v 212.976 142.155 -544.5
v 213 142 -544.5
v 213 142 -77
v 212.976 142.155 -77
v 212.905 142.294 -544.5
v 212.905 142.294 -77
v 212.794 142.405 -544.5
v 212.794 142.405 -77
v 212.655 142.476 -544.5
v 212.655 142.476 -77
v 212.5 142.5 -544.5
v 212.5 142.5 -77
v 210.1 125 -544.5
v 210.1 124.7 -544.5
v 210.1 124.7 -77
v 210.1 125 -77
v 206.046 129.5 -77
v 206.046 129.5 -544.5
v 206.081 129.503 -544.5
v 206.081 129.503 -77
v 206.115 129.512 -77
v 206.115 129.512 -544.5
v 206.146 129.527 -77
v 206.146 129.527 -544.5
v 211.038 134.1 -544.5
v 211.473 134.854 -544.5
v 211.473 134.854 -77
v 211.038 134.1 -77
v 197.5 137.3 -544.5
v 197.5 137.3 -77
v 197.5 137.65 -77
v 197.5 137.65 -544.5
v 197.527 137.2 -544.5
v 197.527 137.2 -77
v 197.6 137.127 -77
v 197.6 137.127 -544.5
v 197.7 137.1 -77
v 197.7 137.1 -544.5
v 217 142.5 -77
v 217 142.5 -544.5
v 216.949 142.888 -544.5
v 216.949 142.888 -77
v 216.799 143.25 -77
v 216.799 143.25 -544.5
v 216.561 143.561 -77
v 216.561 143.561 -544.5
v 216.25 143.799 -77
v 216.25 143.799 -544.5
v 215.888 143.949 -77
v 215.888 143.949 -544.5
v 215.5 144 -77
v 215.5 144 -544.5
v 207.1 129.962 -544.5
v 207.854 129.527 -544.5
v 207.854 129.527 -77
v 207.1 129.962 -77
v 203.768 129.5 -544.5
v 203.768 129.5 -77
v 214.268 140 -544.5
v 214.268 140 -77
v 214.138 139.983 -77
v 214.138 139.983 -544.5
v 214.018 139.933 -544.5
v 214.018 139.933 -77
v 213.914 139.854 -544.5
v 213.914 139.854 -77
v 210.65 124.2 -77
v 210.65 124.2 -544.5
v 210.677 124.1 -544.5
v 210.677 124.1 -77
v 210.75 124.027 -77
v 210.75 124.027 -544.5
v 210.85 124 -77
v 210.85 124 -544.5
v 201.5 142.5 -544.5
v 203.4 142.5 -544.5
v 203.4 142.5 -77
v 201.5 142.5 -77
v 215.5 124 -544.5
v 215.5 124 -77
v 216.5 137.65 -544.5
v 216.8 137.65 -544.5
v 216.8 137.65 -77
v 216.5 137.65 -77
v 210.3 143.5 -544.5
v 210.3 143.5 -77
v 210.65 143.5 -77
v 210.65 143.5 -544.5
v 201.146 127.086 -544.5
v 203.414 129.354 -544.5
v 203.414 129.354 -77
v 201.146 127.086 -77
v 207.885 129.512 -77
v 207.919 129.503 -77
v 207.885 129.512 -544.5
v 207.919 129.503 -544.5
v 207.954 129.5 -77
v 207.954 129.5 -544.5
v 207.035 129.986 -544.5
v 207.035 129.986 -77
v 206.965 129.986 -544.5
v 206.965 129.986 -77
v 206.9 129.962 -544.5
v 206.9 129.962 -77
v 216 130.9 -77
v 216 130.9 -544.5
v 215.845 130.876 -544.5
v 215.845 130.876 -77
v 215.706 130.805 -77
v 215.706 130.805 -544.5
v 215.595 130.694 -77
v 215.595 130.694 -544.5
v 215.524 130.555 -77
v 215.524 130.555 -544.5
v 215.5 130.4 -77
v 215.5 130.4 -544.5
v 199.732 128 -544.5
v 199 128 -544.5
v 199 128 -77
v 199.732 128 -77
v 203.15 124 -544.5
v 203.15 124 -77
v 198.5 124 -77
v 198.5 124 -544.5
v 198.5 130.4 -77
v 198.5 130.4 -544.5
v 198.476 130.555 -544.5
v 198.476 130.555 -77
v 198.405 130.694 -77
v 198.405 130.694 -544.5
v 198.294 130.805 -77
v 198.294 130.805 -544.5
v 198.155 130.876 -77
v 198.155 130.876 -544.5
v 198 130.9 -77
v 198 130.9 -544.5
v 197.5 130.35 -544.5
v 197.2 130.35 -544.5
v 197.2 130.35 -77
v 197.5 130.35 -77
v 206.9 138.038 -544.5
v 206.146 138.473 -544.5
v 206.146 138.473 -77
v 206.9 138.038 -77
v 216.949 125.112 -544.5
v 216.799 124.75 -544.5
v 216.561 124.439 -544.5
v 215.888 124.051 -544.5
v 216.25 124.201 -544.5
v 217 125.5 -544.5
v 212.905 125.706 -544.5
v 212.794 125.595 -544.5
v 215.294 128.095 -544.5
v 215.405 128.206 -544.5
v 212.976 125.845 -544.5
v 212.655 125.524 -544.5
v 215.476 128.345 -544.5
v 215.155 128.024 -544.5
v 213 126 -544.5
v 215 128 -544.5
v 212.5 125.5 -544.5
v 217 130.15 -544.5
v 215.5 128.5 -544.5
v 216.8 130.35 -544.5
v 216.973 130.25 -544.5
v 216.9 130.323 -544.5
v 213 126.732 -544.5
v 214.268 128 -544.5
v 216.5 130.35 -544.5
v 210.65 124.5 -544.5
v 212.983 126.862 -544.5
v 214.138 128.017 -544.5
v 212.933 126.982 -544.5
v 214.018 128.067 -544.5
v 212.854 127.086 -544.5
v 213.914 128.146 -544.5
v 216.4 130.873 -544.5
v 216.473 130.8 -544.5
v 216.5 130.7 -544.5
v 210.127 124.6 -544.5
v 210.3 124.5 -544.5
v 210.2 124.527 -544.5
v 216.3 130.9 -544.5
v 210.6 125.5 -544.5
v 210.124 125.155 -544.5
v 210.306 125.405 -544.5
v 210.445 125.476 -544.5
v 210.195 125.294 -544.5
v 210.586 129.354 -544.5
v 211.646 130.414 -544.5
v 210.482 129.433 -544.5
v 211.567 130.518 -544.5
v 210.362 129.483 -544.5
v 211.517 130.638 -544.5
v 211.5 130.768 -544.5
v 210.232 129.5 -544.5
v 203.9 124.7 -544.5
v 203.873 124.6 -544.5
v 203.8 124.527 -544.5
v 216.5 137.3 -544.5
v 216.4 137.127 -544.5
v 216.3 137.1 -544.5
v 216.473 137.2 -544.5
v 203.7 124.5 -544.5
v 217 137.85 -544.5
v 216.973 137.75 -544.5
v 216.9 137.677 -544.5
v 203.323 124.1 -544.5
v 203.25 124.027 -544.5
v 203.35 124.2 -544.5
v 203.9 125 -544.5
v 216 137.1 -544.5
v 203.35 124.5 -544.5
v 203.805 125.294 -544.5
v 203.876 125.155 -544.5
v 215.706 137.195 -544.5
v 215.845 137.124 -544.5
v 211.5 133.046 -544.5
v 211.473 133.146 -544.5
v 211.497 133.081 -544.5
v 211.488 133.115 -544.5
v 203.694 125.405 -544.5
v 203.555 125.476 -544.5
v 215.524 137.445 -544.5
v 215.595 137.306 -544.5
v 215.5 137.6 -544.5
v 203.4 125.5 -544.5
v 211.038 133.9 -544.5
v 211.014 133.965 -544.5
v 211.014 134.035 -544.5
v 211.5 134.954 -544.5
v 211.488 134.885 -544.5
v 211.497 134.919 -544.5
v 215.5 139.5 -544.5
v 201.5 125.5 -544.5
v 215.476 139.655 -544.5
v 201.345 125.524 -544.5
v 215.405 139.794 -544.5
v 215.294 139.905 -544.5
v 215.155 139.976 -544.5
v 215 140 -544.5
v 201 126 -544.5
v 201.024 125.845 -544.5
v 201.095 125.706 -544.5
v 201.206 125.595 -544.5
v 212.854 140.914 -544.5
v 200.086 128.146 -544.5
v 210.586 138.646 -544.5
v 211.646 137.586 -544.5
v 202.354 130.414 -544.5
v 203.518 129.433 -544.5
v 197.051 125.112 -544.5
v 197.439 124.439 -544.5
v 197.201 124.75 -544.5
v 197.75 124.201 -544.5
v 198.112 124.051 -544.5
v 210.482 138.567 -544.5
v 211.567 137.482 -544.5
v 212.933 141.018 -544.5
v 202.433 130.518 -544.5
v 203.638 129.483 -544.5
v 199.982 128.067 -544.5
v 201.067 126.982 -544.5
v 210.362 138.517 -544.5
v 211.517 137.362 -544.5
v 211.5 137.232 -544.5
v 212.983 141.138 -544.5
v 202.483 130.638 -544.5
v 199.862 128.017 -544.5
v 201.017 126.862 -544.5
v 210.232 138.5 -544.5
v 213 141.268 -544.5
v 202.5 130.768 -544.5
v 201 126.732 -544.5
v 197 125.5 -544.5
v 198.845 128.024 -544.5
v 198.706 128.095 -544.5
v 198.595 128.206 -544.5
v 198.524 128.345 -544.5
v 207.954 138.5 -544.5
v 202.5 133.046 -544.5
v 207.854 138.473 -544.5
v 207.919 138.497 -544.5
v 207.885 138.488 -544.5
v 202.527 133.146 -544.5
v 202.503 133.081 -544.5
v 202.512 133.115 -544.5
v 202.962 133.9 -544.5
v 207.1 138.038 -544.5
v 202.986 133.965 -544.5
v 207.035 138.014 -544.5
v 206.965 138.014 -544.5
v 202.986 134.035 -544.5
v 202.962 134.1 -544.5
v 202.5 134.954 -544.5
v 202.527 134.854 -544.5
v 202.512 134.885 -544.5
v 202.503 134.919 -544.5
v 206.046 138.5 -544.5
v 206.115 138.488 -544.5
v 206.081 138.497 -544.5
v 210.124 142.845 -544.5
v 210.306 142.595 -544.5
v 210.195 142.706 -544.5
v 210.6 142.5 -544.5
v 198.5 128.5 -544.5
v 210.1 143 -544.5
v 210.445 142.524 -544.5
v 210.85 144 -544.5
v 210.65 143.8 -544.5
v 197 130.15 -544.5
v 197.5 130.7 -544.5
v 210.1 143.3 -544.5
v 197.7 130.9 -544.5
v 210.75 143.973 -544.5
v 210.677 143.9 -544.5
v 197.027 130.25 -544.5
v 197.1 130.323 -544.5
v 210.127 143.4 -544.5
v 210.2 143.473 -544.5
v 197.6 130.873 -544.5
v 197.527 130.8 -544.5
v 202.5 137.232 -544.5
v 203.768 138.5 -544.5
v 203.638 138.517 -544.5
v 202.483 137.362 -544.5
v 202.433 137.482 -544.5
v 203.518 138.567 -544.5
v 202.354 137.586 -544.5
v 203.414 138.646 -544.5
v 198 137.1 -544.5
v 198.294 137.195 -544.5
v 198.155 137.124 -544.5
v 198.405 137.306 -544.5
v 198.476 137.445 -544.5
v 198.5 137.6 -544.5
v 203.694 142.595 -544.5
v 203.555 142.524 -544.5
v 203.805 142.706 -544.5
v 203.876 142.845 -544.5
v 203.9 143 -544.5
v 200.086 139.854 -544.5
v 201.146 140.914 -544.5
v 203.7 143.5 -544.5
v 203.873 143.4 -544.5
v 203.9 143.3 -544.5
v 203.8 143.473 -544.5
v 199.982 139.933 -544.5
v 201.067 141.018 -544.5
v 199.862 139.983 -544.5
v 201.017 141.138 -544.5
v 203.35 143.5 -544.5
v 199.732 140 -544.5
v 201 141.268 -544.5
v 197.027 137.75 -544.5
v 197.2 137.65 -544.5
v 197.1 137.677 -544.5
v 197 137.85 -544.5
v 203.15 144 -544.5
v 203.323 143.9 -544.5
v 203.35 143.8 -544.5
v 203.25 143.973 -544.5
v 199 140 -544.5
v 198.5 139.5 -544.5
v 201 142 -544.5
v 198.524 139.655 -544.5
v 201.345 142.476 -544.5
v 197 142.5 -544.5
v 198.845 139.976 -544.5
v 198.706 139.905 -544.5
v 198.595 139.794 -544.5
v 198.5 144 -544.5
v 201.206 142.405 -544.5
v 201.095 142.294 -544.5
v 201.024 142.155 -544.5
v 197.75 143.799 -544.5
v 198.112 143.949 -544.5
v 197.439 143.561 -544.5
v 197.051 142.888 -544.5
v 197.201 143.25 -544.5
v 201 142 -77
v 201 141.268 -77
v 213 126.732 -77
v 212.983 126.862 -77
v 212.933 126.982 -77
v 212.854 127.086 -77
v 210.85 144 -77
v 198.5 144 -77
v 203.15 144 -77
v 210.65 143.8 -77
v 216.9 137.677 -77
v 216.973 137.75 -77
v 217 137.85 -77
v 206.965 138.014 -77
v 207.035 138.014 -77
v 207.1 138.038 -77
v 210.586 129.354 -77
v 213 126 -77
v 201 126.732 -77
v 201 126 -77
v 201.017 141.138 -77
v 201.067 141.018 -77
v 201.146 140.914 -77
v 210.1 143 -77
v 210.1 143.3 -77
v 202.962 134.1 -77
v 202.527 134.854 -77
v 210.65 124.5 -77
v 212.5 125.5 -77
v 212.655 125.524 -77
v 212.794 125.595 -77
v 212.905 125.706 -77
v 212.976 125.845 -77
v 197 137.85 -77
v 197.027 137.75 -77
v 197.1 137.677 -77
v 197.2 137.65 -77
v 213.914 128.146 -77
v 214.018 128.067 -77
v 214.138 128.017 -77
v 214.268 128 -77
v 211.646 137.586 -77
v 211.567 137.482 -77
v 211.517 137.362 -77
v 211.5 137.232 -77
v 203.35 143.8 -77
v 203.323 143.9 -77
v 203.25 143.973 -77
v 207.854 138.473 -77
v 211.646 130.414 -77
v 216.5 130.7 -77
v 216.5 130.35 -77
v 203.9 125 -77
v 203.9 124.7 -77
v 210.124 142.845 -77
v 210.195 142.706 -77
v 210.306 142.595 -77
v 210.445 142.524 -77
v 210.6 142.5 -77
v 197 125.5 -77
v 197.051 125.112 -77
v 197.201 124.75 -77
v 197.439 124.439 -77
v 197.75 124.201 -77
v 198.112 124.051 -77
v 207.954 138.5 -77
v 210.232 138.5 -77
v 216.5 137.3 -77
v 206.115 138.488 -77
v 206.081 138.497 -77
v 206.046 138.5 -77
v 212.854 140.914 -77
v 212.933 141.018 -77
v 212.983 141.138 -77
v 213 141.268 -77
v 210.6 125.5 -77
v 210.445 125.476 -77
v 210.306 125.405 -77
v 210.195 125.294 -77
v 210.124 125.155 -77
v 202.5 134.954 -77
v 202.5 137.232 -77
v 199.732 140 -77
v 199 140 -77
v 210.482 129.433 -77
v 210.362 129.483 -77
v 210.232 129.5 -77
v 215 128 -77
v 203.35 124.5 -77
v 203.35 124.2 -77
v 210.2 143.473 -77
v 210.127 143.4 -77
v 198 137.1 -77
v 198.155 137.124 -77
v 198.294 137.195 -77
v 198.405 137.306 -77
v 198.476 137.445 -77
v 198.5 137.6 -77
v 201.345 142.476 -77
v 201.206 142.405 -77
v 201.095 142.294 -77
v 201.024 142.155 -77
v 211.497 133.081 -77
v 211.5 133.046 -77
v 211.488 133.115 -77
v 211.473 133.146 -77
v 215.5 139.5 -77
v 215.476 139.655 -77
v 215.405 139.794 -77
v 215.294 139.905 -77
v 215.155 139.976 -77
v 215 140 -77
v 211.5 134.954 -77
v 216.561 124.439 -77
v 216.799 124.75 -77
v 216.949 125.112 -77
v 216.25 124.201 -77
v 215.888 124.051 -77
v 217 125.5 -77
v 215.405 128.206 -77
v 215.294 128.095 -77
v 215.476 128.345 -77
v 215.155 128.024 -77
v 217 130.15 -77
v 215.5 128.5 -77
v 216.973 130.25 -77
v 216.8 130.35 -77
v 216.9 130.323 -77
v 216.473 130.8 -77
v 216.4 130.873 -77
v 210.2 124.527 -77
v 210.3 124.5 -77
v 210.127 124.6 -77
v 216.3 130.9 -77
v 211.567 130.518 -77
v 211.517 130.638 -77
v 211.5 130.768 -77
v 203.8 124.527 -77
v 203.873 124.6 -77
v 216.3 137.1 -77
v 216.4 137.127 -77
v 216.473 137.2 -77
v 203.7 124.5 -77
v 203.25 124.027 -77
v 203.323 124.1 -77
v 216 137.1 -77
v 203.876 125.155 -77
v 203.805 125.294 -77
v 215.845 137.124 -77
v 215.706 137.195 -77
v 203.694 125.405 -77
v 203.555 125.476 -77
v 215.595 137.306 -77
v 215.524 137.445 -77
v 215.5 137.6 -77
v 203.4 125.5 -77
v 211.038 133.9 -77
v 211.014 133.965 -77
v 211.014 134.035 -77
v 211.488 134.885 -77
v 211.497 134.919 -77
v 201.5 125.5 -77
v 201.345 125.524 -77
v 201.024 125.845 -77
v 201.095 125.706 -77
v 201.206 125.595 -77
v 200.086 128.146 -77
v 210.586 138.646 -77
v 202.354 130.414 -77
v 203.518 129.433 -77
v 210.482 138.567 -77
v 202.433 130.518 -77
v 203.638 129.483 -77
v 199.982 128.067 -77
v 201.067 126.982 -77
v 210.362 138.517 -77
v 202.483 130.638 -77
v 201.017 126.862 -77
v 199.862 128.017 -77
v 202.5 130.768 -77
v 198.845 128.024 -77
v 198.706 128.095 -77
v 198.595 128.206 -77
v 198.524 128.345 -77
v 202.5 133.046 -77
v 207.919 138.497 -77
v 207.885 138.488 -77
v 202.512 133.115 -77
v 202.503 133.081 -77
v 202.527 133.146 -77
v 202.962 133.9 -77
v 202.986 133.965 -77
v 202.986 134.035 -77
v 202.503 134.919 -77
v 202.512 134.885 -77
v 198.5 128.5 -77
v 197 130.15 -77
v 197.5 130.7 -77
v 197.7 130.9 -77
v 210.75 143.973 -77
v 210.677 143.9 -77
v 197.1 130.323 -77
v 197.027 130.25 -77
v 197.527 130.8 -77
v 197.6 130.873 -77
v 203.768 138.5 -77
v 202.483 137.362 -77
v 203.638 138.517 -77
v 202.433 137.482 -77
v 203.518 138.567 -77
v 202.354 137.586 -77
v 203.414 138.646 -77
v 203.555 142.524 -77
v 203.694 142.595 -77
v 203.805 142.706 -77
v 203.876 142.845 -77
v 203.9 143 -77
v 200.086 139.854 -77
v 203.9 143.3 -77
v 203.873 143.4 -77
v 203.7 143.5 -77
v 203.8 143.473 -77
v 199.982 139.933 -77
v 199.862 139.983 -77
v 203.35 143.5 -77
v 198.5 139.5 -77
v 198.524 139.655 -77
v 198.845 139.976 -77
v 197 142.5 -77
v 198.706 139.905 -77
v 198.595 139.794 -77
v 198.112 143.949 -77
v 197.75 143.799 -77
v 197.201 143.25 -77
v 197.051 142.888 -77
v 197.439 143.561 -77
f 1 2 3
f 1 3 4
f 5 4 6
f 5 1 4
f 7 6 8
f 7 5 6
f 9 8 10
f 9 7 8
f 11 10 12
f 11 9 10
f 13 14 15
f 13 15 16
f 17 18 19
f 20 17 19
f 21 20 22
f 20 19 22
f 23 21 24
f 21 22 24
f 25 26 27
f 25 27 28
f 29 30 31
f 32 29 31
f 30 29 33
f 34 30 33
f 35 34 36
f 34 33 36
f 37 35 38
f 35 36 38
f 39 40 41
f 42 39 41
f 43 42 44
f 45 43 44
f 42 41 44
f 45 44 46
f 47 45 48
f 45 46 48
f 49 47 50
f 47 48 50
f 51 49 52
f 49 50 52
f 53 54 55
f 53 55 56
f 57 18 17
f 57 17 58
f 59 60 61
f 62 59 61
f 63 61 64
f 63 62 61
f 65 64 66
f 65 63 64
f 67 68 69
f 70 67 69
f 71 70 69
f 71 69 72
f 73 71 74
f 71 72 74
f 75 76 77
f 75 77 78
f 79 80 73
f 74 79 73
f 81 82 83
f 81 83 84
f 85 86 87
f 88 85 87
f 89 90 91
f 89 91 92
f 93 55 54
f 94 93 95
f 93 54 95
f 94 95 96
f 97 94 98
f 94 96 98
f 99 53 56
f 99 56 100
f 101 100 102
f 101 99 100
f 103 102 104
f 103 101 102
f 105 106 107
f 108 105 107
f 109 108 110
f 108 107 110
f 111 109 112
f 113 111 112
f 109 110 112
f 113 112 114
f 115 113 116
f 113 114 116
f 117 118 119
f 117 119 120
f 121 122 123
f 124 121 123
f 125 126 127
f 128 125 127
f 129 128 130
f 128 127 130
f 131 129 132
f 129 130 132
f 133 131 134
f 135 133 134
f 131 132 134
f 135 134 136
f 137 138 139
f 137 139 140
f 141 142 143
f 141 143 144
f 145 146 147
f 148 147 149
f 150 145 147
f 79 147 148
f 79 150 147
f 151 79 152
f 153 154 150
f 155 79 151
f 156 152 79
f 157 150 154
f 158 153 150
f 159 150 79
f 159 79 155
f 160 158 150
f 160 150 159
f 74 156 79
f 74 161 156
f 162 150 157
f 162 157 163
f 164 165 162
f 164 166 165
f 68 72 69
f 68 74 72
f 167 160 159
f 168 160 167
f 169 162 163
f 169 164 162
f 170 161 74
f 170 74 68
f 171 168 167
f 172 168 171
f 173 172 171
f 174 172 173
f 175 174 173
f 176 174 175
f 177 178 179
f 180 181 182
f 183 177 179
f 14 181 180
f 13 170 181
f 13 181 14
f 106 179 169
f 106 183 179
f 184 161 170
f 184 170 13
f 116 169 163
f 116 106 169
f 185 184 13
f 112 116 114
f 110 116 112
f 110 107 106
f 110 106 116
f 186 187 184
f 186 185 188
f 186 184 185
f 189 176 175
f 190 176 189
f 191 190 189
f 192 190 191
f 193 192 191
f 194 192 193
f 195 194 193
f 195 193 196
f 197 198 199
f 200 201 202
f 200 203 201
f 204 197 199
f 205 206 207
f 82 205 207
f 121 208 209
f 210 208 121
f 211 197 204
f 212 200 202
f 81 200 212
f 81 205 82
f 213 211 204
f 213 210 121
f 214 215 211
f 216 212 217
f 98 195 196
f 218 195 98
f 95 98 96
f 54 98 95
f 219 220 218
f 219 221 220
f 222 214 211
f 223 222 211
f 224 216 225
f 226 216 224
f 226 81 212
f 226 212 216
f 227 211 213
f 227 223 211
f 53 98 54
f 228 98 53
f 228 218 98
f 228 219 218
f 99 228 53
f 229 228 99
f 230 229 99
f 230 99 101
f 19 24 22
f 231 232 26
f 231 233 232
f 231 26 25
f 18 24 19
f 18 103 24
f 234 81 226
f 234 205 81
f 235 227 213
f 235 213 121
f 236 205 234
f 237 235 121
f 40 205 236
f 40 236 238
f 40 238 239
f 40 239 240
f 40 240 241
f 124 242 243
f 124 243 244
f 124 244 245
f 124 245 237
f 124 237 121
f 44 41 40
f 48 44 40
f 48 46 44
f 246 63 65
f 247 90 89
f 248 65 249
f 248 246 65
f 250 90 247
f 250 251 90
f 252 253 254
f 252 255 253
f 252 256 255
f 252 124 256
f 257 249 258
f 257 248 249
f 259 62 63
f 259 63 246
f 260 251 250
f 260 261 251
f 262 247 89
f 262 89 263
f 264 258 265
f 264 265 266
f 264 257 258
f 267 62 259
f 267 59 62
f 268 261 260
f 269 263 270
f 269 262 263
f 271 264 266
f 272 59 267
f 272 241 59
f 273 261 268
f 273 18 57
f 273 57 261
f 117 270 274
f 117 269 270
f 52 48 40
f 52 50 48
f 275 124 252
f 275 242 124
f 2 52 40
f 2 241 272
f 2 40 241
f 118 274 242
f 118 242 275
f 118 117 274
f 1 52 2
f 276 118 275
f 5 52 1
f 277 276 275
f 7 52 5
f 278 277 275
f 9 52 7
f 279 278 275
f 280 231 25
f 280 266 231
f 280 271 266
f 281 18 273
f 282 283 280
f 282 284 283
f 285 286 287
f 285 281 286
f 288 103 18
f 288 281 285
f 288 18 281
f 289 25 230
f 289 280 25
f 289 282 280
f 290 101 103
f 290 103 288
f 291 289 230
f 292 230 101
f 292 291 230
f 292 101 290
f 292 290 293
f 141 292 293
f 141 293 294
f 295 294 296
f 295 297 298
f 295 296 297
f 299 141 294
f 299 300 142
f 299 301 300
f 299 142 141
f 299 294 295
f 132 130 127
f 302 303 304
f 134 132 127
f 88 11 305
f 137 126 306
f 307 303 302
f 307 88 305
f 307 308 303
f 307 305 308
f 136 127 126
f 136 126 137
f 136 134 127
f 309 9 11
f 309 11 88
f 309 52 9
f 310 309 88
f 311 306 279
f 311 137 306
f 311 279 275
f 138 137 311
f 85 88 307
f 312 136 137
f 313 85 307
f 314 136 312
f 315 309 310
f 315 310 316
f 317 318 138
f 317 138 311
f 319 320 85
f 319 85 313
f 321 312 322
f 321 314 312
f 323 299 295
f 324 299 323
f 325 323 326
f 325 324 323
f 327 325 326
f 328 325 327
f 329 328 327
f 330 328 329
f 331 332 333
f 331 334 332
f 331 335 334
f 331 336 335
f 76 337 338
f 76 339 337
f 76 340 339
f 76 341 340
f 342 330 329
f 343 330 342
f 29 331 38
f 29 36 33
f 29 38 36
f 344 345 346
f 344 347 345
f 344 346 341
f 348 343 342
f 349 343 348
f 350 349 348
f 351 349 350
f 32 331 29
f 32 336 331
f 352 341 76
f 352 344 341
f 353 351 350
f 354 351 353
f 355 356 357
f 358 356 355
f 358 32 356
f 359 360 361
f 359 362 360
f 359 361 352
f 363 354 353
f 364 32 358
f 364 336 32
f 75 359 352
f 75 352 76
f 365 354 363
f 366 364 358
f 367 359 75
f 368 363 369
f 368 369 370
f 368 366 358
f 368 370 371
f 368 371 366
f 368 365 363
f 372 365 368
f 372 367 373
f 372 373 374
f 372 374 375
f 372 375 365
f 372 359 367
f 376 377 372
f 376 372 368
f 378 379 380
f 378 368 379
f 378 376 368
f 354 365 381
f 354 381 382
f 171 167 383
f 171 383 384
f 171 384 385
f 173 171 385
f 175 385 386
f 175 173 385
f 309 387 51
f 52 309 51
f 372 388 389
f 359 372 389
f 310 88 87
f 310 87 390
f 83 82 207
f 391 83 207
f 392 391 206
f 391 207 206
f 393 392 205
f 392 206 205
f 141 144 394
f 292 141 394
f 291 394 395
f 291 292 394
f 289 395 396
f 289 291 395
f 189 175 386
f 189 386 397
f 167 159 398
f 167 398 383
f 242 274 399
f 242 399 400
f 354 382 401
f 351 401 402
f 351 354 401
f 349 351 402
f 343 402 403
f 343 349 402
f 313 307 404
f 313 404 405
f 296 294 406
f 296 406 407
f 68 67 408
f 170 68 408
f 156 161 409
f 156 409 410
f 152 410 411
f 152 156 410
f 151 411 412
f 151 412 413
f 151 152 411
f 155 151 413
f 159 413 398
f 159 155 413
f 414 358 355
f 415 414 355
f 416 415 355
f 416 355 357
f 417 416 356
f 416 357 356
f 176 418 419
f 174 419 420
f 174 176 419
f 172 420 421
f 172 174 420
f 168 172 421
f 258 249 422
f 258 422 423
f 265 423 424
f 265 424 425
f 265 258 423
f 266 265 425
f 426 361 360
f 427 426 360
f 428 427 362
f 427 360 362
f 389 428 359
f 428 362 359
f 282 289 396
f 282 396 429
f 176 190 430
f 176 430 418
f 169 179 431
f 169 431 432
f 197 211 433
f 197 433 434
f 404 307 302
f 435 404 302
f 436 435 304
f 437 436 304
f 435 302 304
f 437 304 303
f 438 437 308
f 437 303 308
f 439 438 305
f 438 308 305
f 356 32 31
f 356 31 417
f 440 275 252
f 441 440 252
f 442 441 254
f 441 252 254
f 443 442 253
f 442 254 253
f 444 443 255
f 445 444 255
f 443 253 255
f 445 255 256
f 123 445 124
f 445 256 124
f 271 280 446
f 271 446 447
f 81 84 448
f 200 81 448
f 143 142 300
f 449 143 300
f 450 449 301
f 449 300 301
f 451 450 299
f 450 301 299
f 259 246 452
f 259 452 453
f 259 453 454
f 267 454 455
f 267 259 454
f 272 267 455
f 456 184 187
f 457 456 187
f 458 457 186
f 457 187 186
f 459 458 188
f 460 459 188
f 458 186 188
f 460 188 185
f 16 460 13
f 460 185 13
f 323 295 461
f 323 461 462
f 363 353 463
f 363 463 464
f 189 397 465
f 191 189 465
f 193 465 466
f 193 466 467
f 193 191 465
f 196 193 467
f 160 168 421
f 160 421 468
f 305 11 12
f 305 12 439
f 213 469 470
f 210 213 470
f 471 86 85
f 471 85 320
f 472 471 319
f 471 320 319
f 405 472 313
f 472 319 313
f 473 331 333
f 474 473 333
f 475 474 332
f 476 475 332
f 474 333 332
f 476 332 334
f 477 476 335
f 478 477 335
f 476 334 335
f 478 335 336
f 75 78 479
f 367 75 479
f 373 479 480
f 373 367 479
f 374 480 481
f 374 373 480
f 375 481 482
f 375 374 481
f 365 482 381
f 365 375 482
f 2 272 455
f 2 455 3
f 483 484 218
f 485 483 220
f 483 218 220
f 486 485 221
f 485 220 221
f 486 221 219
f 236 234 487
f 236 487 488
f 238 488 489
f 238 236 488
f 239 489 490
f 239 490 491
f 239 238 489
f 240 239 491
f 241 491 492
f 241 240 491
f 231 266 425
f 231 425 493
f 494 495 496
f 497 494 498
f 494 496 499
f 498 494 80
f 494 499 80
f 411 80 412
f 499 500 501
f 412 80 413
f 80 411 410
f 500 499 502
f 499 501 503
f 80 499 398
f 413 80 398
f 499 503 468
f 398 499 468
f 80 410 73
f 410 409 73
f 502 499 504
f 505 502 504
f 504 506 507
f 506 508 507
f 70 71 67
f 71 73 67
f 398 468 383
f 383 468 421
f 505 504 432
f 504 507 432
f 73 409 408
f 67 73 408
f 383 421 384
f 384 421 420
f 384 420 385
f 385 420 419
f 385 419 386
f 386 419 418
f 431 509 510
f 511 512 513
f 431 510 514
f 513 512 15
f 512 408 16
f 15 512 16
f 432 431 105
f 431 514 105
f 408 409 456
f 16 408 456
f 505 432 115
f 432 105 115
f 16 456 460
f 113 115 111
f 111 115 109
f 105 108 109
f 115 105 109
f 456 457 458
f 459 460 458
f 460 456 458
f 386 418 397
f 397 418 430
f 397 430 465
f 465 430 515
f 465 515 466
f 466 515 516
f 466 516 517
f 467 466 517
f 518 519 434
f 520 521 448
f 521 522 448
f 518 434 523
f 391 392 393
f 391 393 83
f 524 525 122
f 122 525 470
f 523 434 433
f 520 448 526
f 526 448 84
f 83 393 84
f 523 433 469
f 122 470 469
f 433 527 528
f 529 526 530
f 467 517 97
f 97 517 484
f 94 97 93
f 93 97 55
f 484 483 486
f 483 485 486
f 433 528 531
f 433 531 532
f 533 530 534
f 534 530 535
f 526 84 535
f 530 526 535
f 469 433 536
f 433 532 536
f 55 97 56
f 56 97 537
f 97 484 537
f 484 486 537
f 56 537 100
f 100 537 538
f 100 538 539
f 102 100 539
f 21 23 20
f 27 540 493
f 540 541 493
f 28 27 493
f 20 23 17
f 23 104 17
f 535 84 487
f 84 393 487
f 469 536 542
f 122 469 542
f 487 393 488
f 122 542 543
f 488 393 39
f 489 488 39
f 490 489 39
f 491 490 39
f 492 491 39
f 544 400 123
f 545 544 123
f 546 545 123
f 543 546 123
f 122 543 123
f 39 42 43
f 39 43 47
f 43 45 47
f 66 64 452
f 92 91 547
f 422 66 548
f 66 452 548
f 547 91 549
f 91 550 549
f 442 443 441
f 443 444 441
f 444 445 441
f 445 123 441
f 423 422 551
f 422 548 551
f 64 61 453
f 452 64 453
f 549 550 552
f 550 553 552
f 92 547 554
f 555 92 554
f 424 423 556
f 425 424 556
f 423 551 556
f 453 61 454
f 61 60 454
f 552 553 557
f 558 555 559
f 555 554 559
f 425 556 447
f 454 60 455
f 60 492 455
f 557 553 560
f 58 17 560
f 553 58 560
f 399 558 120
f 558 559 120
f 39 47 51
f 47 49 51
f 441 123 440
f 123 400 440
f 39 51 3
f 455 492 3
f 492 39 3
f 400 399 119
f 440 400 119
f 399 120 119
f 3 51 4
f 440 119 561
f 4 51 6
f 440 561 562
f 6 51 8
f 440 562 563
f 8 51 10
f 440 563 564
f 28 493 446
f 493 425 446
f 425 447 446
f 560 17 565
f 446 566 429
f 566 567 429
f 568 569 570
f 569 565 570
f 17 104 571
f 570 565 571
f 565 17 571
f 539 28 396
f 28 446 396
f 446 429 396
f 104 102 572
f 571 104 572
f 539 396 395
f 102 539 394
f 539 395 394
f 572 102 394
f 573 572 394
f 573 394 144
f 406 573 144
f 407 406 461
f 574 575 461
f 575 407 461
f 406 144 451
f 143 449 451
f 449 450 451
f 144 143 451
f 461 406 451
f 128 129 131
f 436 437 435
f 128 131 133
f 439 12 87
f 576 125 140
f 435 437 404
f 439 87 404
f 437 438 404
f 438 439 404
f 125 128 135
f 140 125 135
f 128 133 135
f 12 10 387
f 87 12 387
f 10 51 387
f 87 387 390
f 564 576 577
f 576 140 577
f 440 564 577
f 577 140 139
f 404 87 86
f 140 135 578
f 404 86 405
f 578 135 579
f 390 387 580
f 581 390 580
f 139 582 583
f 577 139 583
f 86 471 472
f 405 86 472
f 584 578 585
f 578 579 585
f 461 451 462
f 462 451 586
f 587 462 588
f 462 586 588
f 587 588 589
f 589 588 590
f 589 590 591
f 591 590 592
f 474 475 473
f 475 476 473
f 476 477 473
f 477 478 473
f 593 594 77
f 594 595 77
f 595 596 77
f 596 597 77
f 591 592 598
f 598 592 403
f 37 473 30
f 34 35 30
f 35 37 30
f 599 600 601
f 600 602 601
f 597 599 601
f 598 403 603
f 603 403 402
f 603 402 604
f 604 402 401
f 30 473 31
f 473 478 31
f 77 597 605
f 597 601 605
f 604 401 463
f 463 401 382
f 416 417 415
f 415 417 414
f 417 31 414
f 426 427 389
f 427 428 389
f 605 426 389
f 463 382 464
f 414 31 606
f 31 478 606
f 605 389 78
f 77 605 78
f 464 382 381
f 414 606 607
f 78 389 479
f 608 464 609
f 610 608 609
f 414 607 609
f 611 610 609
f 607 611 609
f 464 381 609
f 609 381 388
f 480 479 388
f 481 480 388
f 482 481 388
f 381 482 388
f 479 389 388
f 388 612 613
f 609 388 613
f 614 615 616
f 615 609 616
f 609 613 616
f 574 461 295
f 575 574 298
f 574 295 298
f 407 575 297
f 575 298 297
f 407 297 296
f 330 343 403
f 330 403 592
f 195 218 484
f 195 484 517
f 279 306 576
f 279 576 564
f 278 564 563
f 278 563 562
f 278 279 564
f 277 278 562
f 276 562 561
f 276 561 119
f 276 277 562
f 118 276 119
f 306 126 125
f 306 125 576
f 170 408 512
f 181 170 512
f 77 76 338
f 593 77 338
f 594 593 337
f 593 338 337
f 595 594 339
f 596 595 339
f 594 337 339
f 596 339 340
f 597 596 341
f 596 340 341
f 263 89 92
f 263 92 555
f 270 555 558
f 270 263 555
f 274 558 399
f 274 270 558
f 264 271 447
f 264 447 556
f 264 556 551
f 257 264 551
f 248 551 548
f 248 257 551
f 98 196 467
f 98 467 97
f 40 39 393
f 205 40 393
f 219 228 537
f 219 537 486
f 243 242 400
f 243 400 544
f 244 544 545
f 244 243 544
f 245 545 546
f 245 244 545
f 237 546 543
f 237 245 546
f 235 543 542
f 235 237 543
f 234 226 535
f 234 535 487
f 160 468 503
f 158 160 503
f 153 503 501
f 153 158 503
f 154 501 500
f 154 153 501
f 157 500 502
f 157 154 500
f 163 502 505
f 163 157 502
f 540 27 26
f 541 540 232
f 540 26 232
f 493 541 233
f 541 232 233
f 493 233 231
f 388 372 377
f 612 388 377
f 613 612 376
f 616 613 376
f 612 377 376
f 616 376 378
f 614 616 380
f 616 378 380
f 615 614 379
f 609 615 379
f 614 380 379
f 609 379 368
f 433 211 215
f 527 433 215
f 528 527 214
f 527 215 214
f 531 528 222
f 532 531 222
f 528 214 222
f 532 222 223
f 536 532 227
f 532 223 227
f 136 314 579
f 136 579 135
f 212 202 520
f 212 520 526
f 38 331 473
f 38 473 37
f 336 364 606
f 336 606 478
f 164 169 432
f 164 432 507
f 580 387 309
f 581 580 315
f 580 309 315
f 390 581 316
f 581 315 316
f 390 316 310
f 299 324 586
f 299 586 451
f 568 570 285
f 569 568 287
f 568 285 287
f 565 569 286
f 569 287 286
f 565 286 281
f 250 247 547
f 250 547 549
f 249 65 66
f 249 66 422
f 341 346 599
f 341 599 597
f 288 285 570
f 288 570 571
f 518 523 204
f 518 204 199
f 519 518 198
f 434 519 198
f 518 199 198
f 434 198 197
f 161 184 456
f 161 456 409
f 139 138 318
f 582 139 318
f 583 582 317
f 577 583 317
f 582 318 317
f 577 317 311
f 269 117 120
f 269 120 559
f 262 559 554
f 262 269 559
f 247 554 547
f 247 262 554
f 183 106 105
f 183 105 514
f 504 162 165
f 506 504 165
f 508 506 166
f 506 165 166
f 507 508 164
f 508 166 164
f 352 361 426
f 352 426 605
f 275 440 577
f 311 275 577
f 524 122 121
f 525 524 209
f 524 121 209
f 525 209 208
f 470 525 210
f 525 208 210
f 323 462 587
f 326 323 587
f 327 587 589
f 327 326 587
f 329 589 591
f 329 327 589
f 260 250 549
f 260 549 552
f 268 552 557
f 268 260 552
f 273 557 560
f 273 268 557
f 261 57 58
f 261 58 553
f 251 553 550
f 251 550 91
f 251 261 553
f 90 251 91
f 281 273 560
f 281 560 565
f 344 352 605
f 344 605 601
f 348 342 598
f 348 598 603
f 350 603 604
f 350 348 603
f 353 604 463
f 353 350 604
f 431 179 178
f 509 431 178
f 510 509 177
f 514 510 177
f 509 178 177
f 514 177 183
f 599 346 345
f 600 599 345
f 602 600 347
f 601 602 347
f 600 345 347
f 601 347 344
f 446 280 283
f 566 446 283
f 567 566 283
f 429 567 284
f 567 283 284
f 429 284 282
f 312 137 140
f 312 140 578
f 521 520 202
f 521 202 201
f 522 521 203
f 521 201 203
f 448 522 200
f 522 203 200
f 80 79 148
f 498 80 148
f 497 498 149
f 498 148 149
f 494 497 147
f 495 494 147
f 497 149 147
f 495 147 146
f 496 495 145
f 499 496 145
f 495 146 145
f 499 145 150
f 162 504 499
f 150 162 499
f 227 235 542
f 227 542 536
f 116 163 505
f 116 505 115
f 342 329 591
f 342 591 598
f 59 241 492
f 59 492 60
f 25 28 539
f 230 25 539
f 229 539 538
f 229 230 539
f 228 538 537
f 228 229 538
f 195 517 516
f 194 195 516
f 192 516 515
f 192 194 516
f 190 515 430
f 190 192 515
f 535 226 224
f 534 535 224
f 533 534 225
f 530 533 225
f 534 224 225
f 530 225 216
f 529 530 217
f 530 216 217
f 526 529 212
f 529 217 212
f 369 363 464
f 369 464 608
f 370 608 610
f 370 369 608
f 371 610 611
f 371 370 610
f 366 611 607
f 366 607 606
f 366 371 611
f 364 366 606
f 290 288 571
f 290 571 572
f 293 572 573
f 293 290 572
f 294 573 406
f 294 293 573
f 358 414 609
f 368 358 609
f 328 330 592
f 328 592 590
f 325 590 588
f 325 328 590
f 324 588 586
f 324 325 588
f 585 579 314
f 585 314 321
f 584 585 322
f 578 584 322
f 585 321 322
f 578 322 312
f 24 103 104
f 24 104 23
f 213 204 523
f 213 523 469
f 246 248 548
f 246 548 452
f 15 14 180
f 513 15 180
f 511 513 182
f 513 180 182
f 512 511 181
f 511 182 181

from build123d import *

# Parameters (mm, degrees)
PAD013_DEPTH    = 467.5
POCKET030_DEPTH = 467.501


with BuildPart() as pad013:
    # Sketch045 → Pad013 (new body)
    with BuildSketch(Plane(origin=(1.5, 0, 0), x_dir=(1, 0, 0), z_dir=(0, 0, 1))):
        with BuildLine():
            Line((0, 20), (4.65, 20))
            ThreePointArc((4.85, 19.8), (4.791421, 19.941421), (4.65, 20))
            Line((4.85, 19.8), (4.85, 19.5))
            Line((4.85, 19.5), (5.2, 19.5))
            ThreePointArc((5.4, 19.3), (5.341421, 19.441421), (5.2, 19.5))
            Line((5.4, 19.3), (5.4, 19))
            ThreePointArc((4.9, 18.5), (5.253553, 18.646446), (5.4, 19))
            Line((4.9, 18.5), (2.999999, 18.5))
            ThreePointArc((2.999999, 18.5), (2.646446, 18.353553), (2.499999, 18))
            Line((2.499999, 18), (2.499999, 17.267767))
            ThreePointArc((2.499999, 17.267767), (2.53806, 17.076425), (2.646446, 16.914213))
            Line((2.646446, 16.914213), (4.914213, 14.646447))
            ThreePointArc((4.914213, 14.646447), (5.076424, 14.53806), (5.267766, 14.5))
            Line((5.267766, 14.5), (7.54641, 14.5))
            ThreePointArc((7.64641, 14.473205), (7.598173, 14.493185), (7.54641, 14.5))
            Line((7.64641, 14.473205), (8.4, 14.03812))
            ThreePointArc((8.4, 14.03812), (8.5, 14.011325), (8.6, 14.03812))
            Line((8.6, 14.03812), (9.35359, 14.473205))
            ThreePointArc((9.45359, 14.5), (9.401827, 14.493185), (9.35359, 14.473205))
            Line((9.45359, 14.5), (11.732234, 14.5))
            ThreePointArc((11.732234, 14.5), (11.923576, 14.53806), (12.085787, 14.646447))
            Line((12.085787, 14.646447), (14.353554, 16.914213))
            ThreePointArc((14.353554, 16.914213), (14.46194, 17.076425), (14.500001, 17.267767))
            Line((14.500001, 17.267767), (14.500001, 18))
            ThreePointArc((14.500001, 18), (14.353554, 18.353553), (14.000001, 18.5))
            Line((14.000001, 18.5), (12.1, 18.5))
            ThreePointArc((11.6, 19), (11.746447, 18.646446), (12.1, 18.5))
            Line((11.6, 19), (11.6, 19.3))
            ThreePointArc((11.8, 19.5), (11.658579, 19.441421), (11.6, 19.3))
            Line((11.8, 19.5), (12.15, 19.5))
            Line((12.15, 19.5), (12.15, 19.8))
            ThreePointArc((12.35, 20), (12.208579, 19.941421), (12.15, 19.8))
            Line((12.35, 20), (17, 20))
            ThreePointArc((18.5, 18.5), (18.06066, 19.56066), (17, 20))
            Line((18.5, 18.5), (18.5, 13.85))
            ThreePointArc((18.3, 13.65), (18.441421, 13.708578), (18.5, 13.85))
            Line((18.3, 13.65), (18, 13.65))
            Line((18, 13.65), (18, 13.3))
            ThreePointArc((17.8, 13.1), (17.941421, 13.158579), (18, 13.3))
            Line((17.8, 13.1), (17.5, 13.1))
            ThreePointArc((17, 13.6), (17.146446, 13.246447), (17.5, 13.1))
            Line((17, 13.6), (17, 15.5))
            ThreePointArc((17, 15.5), (16.853553, 15.853553), (16.5, 16))
            Line((16.5, 16), (15.767767, 16))
            ThreePointArc((15.767767, 16), (15.576425, 15.961939), (15.414213, 15.853553))
            Line((15.414213, 15.853553), (13.146446, 13.585786))
            ThreePointArc((13.146446, 13.585786), (13.03806, 13.423574), (13, 13.232233))
            Line((13, 13.232233), (13, 10.953589))
            ThreePointArc((12.973205, 10.853589), (12.993185, 10.901825), (13, 10.953589))
            Line((12.973205, 10.853589), (12.53812, 10.1))
            ThreePointArc((12.53812, 10.1), (12.511325, 10), (12.53812, 9.9))
            Line((12.53812, 9.9), (12.973205, 9.146411))
            ThreePointArc((13, 9.046411), (12.993185, 9.098175), (12.973205, 9.146411))
            Line((13, 9.046411), (13, 6.767767))
            ThreePointArc((13, 6.767767), (13.03806, 6.576426), (13.146446, 6.414214))
            Line((13.146446, 6.414214), (15.414213, 4.146447))
            ThreePointArc((15.414213, 4.146447), (15.576425, 4.038061), (15.767767, 4))
            Line((15.767767, 4), (16.5, 4))
            ThreePointArc((16.5, 4), (16.853553, 4.146447), (17, 4.5))
            Line((17, 4.5), (17, 6.4))
            ThreePointArc((17.5, 6.9), (17.146446, 6.753553), (17, 6.4))
            Line((17.5, 6.9), (17.8, 6.9))
            ThreePointArc((18, 6.7), (17.941421, 6.841421), (17.8, 6.9))
            Line((18, 6.7), (18, 6.35))
            Line((18, 6.35), (18.3, 6.35))
            ThreePointArc((18.5, 6.15), (18.441421, 6.291422), (18.3, 6.35))
            Line((18.5, 6.15), (18.5, 1.5))
            ThreePointArc((17, 0), (18.06066, 0.43934), (18.5, 1.5))
            Line((17, 0), (12.35, 0))
            ThreePointArc((12.15, 0.2), (12.208579, 0.058579), (12.35, 0))
            Line((12.15, 0.2), (12.15, 0.5))
            Line((12.15, 0.5), (11.8, 0.5))
            ThreePointArc((11.6, 0.7), (11.658579, 0.558579), (11.8, 0.5))
            Line((11.6, 0.7), (11.6, 1))
            ThreePointArc((12.1, 1.5), (11.746447, 1.353554), (11.6, 1))
            Line((12.1, 1.5), (14.000001, 1.5))
            ThreePointArc((14.000001, 1.5), (14.353554, 1.646447), (14.500001, 2))
            Line((14.500001, 2), (14.500001, 2.732233))
            ThreePointArc((14.500001, 2.732233), (14.46194, 2.923575), (14.353554, 3.085787))
            Line((14.353554, 3.085787), (12.085787, 5.353553))
            ThreePointArc((12.085787, 5.353553), (11.923576, 5.46194), (11.732234, 5.5))
            Line((11.732234, 5.5), (9.45359, 5.5))
            ThreePointArc((9.35359, 5.526795), (9.401827, 5.506815), (9.45359, 5.5))
            Line((9.35359, 5.526795), (8.6, 5.96188))
            ThreePointArc((8.6, 5.96188), (8.5, 5.988675), (8.4, 5.96188))
            Line((8.4, 5.96188), (7.64641, 5.526795))
            ThreePointArc((7.54641, 5.5), (7.598173, 5.506815), (7.64641, 5.526795))
            Line((7.54641, 5.5), (5.267766, 5.5))
            ThreePointArc((5.267766, 5.5), (5.076424, 5.46194), (4.914213, 5.353553))
            Line((4.914213, 5.353553), (2.646446, 3.085787))
            ThreePointArc((2.646446, 3.085787), (2.53806, 2.923575), (2.499999, 2.732233))
            Line((2.499999, 2.732233), (2.499999, 2))
            ThreePointArc((2.499999, 2), (2.646446, 1.646447), (2.999999, 1.5))
            Line((2.999999, 1.5), (4.9, 1.5))
            ThreePointArc((5.4, 1), (5.253553, 1.353554), (4.9, 1.5))
            Line((5.4, 1), (5.4, 0.7))
            ThreePointArc((5.2, 0.5), (5.341421, 0.558579), (5.4, 0.7))
            Line((5.2, 0.5), (4.85, 0.5))
            Line((4.85, 0.5), (4.85, 0.2))
            ThreePointArc((4.65, 0), (4.791421, 0.058579), (4.85, 0.2))
            Line((4.65, 0), (0, 0))
            ThreePointArc((-1.5, 1.5), (-1.06066, 0.43934), (0, 0))
            Line((-1.5, 1.5), (-1.5, 6.15))
            ThreePointArc((-1.3, 6.35), (-1.441421, 6.291422), (-1.5, 6.15))
            Line((-1.3, 6.35), (-1, 6.35))
            Line((-1, 6.35), (-1, 6.7))
            ThreePointArc((-0.8, 6.9), (-0.941421, 6.841421), (-1, 6.7))
            Line((-0.8, 6.9), (-0.5, 6.9))
            ThreePointArc((0, 6.4), (-0.146446, 6.753553), (-0.5, 6.9))
            Line((0, 6.4), (0, 4.5))
            ThreePointArc((0, 4.5), (0.146447, 4.146447), (0.5, 4))
            Line((0.5, 4), (1.232233, 4))
            ThreePointArc((1.232233, 4), (1.423575, 4.038061), (1.585787, 4.146447))
            Line((1.585787, 4.146447), (3.853554, 6.414214))
            ThreePointArc((3.853554, 6.414214), (3.96194, 6.576426), (4, 6.767767))
            Line((4, 6.767767), (4, 9.046411))
            ThreePointArc((4.026795, 9.146411), (4.006815, 9.098175), (4, 9.046411))
            Line((4.026795, 9.146411), (4.46188, 9.9))
            ThreePointArc((4.46188, 9.9), (4.488675, 10), (4.46188, 10.1))
            Line((4.46188, 10.1), (4.026795, 10.853589))
            ThreePointArc((4, 10.953589), (4.006815, 10.901825), (4.026795, 10.853589))
            Line((4, 10.953589), (4, 13.232233))
            ThreePointArc((4, 13.232233), (3.96194, 13.423574), (3.853554, 13.585786))
            Line((3.853554, 13.585786), (1.585787, 15.853553))
            ThreePointArc((1.585787, 15.853553), (1.423575, 15.961939), (1.232233, 16))
            Line((1.232233, 16), (0.5, 16))
            ThreePointArc((0.5, 16), (0.146447, 15.853553), (0, 15.5))
            Line((0, 15.5), (0, 13.6))
            ThreePointArc((-0.5, 13.1), (-0.146446, 13.246447), (0, 13.6))
            Line((-0.5, 13.1), (-0.8, 13.1))
            ThreePointArc((-1, 13.3), (-0.941421, 13.158579), (-0.8, 13.1))
            Line((-1, 13.3), (-1, 13.65))
            Line((-1, 13.65), (-1.3, 13.65))
            ThreePointArc((-1.5, 13.85), (-1.441421, 13.708578), (-1.3, 13.65))
            Line((-1.5, 13.85), (-1.5, 18.5))
            ThreePointArc((0, 20), (-1.06066, 19.56066), (-1.5, 18.5))
        make_face()
    extrude(amount=PAD013_DEPTH)


with BuildPart() as fusion031:
    # Pocket030 base: copy of Pad013
    add(pad013.part)

    # Sketch046 → Pocket030 (cut, through all)
    with BuildSketch(Plane(origin=(1.5, 0, 467.5), x_dir=(1, 0, 0), z_dir=(0, 0, 1))):
        with BuildLine():
            ThreePointArc((6.586105, 12.989641), (5.988263, 12.50841), (5.507825, 11.909931))
            Line((6.054705, 11.258185), (5.507825, 11.909931))
            ThreePointArc((6.054705, 11.258185), (5.75, 10), (6.054705, 8.741815))
            Line((5.507825, 8.090069), (6.054705, 8.741815))
            ThreePointArc((5.507825, 8.090069), (5.988263, 7.49159), (6.586105, 7.010359))
            Line((7.241815, 7.554705), (6.586105, 7.010359))
            ThreePointArc((7.241815, 7.554705), (8.5, 7.25), (9.758185, 7.554705))
            Line((10.413895, 7.010359), (9.758185, 7.554705))
            ThreePointArc((10.413895, 7.010359), (11.011737, 7.49159), (11.492175, 8.090069))
            Line((10.945295, 8.741815), (11.492175, 8.090069))
            ThreePointArc((10.945295, 8.741815), (11.25, 10), (10.945295, 11.258185))
            Line((11.492175, 11.909931), (10.945295, 11.258185))
            ThreePointArc((11.492175, 11.909931), (11.011737, 12.50841), (10.413895, 12.989641))
            Line((9.758185, 12.445295), (10.413895, 12.989641))
            ThreePointArc((9.758185, 12.445295), (8.5, 12.75), (7.241815, 12.445295))
            Line((6.586105, 12.989641), (7.241815, 12.445295))
        make_face()
    extrude(amount=-POCKET030_DEPTH, mode=Mode.SUBTRACT)

    # Fusion031: union Pad013
    add(pad013.part)


with BuildPart() as fusion031_1:
    # Fusion031 placement: moved
    add(fusion031.part.moved(Location((197, 124, -544.5))))


solid = fusion031_1.part
